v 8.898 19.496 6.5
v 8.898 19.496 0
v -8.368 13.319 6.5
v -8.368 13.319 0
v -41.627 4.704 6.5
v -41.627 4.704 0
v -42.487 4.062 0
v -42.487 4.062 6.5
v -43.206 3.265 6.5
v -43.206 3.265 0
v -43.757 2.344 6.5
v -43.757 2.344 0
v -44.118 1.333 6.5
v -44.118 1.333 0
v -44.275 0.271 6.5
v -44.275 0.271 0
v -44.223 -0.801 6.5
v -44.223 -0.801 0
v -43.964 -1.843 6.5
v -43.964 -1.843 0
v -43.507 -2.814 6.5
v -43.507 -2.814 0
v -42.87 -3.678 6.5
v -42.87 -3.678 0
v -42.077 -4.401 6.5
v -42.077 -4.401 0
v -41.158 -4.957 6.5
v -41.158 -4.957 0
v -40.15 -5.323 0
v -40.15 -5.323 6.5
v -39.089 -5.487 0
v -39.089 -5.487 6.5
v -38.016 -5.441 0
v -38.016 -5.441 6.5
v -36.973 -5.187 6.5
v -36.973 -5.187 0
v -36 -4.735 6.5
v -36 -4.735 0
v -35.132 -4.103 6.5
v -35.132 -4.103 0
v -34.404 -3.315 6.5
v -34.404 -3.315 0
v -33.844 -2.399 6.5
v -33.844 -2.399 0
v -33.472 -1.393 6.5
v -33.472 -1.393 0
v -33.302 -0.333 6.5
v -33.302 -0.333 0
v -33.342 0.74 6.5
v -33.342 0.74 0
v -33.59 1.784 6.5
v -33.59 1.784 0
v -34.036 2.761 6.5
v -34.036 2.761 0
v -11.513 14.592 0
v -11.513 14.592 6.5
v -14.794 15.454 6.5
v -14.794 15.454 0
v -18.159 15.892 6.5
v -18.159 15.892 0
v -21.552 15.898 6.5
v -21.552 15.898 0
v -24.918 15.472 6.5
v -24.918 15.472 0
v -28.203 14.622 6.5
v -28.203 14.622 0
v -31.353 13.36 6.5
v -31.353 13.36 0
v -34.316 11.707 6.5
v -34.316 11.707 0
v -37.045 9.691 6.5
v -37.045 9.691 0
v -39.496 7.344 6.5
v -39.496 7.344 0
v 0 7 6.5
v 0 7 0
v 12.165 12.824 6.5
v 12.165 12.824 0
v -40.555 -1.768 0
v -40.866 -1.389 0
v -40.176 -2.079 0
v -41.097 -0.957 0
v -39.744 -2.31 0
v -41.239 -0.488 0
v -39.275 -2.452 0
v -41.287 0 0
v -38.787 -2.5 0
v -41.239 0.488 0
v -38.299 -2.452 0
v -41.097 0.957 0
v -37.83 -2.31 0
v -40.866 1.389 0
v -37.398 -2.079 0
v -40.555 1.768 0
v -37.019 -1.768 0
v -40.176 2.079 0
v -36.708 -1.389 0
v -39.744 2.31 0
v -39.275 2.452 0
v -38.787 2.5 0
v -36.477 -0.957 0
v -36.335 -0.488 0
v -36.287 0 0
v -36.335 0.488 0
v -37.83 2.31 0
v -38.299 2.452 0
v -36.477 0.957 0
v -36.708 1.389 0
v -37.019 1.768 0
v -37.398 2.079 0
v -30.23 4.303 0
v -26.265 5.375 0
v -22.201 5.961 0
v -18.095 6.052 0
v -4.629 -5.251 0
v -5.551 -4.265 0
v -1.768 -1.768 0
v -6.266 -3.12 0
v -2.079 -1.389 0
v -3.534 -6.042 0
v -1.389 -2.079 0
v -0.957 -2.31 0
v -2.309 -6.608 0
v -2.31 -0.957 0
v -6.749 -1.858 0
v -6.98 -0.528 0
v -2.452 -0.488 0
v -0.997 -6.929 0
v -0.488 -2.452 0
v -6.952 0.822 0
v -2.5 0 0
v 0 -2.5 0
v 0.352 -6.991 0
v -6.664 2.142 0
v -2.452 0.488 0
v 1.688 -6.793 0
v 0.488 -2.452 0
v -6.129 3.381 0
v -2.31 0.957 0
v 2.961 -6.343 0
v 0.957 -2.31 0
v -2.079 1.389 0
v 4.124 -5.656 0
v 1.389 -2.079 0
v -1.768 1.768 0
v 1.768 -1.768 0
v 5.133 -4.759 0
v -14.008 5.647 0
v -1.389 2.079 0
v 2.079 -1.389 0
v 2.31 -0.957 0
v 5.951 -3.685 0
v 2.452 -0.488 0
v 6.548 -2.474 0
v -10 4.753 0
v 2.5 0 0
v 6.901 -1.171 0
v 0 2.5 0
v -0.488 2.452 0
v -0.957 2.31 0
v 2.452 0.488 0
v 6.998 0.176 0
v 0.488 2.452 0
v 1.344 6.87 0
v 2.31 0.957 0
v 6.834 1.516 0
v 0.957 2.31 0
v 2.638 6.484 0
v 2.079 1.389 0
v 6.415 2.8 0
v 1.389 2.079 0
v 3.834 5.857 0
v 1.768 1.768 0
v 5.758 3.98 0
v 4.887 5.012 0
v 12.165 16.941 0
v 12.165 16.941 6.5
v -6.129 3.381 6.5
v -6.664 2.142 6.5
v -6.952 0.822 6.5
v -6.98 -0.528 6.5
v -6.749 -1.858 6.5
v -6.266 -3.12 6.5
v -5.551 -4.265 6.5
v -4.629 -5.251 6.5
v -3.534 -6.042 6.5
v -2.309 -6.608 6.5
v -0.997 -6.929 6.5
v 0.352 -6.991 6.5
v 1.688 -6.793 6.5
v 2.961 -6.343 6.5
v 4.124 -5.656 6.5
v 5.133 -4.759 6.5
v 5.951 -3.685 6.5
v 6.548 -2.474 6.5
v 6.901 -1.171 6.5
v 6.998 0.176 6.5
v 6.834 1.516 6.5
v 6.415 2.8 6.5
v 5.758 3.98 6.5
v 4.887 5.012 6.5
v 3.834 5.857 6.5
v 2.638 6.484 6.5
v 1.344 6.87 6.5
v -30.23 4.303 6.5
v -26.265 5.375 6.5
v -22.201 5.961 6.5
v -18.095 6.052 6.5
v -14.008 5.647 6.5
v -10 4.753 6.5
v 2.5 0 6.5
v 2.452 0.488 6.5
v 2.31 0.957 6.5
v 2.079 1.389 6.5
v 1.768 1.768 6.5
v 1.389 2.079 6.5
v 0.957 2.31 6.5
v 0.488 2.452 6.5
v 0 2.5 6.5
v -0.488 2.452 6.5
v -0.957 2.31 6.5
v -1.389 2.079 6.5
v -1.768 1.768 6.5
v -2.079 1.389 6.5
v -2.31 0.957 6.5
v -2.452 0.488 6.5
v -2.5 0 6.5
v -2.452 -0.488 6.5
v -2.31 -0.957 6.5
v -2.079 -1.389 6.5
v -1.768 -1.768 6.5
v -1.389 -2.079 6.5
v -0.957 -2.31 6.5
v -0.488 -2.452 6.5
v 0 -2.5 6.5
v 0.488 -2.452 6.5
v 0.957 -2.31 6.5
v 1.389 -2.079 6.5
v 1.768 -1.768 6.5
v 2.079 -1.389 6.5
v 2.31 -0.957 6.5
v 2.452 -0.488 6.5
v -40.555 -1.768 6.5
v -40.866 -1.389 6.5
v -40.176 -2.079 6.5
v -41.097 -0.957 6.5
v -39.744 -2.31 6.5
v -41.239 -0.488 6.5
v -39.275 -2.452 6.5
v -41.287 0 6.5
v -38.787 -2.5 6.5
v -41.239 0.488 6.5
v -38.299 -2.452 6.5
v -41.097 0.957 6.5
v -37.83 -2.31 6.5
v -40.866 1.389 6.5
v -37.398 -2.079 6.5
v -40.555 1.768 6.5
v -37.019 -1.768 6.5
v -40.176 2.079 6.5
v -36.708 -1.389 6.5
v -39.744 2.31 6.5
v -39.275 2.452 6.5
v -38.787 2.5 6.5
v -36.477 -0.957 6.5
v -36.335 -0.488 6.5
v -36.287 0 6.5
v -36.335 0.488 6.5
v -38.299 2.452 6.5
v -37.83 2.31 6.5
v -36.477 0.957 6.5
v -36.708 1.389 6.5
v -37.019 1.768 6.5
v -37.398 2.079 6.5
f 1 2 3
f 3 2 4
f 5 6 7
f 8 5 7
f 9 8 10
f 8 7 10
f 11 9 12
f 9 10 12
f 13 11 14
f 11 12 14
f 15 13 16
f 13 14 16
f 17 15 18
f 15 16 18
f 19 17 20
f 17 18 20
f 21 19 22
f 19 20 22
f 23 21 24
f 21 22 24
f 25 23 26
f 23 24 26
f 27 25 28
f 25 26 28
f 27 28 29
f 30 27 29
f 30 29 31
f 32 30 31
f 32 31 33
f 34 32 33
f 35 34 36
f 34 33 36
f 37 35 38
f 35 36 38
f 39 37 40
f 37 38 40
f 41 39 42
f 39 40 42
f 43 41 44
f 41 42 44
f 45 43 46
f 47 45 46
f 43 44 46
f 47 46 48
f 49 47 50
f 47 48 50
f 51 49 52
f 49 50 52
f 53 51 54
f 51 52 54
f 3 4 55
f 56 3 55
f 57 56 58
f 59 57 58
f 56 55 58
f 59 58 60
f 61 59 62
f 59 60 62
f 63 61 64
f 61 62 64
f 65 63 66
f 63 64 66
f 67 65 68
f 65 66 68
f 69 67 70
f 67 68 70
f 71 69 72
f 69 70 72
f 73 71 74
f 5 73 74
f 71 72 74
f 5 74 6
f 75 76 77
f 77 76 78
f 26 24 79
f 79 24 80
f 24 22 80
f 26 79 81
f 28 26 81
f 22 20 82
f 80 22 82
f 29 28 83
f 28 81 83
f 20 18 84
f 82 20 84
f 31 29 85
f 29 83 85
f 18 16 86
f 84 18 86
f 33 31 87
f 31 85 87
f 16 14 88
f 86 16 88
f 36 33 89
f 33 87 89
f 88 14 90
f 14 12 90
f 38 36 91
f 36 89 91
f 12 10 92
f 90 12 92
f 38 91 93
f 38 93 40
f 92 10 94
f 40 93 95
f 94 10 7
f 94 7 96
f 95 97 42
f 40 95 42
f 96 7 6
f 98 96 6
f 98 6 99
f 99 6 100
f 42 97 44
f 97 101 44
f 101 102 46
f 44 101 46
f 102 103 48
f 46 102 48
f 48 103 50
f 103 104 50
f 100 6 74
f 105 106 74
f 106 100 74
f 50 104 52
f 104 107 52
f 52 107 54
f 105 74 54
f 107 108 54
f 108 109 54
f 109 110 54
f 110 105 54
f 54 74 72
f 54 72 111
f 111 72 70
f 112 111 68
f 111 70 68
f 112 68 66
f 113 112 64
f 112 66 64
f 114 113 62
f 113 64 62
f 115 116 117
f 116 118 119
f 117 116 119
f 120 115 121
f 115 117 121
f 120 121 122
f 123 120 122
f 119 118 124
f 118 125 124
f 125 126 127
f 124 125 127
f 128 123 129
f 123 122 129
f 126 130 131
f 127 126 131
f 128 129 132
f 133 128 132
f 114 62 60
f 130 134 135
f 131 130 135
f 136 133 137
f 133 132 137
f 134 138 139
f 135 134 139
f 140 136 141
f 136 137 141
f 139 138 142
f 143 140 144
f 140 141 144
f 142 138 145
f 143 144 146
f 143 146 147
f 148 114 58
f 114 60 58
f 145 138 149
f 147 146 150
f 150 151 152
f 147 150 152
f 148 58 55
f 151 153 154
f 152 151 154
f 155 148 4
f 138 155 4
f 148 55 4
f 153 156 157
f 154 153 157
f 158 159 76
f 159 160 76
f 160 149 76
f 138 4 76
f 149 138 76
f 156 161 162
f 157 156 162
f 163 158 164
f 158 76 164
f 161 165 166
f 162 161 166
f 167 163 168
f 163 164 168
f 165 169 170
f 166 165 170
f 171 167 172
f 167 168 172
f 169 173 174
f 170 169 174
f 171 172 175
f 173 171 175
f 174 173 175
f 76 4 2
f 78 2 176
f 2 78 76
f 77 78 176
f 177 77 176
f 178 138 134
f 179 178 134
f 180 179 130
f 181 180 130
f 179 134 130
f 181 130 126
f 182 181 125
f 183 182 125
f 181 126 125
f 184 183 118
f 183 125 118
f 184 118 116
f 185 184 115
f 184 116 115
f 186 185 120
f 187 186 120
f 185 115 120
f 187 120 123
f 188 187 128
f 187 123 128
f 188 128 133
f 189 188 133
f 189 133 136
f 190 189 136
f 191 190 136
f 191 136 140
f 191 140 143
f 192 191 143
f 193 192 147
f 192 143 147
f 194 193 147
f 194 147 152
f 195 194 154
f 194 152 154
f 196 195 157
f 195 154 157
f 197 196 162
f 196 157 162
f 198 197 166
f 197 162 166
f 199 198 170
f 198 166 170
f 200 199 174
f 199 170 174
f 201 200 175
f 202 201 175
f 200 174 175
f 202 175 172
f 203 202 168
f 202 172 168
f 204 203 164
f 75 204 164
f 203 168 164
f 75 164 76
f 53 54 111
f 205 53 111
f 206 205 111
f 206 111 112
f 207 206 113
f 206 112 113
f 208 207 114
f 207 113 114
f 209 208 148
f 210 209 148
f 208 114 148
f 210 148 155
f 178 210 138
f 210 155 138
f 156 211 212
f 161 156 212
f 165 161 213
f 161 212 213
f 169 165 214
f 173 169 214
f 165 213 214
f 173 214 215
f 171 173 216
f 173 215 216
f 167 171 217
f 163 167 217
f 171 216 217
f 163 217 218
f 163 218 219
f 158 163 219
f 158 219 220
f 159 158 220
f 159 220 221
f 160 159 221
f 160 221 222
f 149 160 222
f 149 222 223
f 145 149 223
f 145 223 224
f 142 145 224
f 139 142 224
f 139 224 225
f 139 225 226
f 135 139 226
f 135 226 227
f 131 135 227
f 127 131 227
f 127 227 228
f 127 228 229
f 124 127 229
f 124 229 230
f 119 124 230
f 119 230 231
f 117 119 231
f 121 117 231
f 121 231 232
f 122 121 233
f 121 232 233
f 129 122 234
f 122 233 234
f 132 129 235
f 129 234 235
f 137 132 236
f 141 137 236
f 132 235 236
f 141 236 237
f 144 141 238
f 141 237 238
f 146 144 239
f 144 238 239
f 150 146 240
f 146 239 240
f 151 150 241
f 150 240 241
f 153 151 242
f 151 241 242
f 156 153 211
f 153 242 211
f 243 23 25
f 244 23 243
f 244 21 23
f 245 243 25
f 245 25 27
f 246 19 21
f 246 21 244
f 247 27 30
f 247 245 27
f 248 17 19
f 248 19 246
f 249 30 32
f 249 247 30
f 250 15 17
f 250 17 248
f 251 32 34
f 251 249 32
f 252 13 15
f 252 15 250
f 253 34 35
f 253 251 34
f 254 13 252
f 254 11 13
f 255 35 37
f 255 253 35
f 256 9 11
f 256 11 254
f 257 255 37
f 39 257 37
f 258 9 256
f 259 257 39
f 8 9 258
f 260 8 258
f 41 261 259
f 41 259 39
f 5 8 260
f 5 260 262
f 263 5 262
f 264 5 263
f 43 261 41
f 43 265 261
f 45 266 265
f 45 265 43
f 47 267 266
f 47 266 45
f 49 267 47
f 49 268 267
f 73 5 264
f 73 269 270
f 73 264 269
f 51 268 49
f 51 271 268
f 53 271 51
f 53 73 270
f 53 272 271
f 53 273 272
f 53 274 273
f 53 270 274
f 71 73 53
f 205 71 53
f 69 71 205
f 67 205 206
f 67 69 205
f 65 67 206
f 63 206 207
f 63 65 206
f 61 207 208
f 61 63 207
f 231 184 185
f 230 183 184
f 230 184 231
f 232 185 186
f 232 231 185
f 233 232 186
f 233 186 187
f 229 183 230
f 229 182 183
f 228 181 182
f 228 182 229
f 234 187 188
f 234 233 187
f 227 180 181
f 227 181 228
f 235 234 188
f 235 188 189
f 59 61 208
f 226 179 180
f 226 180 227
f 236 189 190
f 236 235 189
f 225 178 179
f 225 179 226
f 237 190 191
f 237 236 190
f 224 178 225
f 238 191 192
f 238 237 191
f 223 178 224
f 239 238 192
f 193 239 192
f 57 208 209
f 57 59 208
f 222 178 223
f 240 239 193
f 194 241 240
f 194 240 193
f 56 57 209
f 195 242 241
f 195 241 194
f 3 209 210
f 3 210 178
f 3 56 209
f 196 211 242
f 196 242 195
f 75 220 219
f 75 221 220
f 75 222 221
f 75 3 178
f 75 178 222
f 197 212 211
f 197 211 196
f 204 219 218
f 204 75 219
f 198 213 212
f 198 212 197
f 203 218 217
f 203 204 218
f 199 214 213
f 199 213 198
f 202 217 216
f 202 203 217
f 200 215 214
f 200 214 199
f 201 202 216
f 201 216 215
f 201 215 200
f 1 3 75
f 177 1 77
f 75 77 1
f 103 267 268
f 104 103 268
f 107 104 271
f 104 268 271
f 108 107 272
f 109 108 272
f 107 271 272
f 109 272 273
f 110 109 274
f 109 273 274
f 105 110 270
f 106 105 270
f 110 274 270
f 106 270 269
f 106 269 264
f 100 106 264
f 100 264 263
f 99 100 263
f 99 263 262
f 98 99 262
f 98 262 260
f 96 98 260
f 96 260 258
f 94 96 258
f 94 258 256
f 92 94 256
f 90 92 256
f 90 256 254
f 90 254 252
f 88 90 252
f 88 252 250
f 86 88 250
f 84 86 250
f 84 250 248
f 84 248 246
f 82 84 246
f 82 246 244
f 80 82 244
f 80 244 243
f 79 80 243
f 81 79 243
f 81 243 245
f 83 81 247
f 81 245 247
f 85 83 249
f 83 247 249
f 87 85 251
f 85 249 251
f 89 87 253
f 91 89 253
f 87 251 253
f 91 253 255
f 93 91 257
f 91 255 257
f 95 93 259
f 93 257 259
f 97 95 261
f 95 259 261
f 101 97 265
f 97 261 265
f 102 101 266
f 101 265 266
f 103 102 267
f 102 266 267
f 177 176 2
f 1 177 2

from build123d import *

# Parameters (mm, degrees)
F1_DEPTH = 6.5
F2_R     = 2.5
F3_DEPTH = 8


with BuildPart() as f1:
    # F0 (on Top) → F1 (new body)
    with BuildSketch(Plane.XY):
        with BuildLine():
            ThreePointArc((-34.035903, 2.760554), (-20.149213, 6.068291), (-6.129181, 3.381293))
            ThreePointArc((-6.129181, 3.381293), (3.558859, -6.027813), (0, 7))
            ThreePointArc((0, 7), (-3.86946, 10.575604), (-8.367613, 13.318645))
            ThreePointArc((-8.367613, 13.318645), (-26.574298, 15.09931), (-41.627142, 4.703827))
            ThreePointArc((-41.627142, 4.703827), (-40.14959, -5.323154), (-34.035903, 2.760554))
        make_face()
        with BuildLine():
            ThreePointArc((-8.367613, 13.318645), (-3.86946, 10.575604), (0, 7))
            Line((0, 7), (12.165275, 12.823824))
            Line((12.165275, 12.823824), (12.165275, 16.940814))
            Line((12.165275, 16.940814), (8.897662, 19.496433))
            Line((8.897662, 19.496433), (-8.367613, 13.318645))
        make_face()
    extrude(amount=F1_DEPTH)

    # F2 (on face) → F3 (cut)
    with BuildSketch(Plane.XY.offset(6.5)):
        Circle(F2_R)
        with Locations((-38.786922, 0)):
            Circle(F2_R)
    extrude(amount=-F3_DEPTH, mode=Mode.SUBTRACT)


solid = f1.part
